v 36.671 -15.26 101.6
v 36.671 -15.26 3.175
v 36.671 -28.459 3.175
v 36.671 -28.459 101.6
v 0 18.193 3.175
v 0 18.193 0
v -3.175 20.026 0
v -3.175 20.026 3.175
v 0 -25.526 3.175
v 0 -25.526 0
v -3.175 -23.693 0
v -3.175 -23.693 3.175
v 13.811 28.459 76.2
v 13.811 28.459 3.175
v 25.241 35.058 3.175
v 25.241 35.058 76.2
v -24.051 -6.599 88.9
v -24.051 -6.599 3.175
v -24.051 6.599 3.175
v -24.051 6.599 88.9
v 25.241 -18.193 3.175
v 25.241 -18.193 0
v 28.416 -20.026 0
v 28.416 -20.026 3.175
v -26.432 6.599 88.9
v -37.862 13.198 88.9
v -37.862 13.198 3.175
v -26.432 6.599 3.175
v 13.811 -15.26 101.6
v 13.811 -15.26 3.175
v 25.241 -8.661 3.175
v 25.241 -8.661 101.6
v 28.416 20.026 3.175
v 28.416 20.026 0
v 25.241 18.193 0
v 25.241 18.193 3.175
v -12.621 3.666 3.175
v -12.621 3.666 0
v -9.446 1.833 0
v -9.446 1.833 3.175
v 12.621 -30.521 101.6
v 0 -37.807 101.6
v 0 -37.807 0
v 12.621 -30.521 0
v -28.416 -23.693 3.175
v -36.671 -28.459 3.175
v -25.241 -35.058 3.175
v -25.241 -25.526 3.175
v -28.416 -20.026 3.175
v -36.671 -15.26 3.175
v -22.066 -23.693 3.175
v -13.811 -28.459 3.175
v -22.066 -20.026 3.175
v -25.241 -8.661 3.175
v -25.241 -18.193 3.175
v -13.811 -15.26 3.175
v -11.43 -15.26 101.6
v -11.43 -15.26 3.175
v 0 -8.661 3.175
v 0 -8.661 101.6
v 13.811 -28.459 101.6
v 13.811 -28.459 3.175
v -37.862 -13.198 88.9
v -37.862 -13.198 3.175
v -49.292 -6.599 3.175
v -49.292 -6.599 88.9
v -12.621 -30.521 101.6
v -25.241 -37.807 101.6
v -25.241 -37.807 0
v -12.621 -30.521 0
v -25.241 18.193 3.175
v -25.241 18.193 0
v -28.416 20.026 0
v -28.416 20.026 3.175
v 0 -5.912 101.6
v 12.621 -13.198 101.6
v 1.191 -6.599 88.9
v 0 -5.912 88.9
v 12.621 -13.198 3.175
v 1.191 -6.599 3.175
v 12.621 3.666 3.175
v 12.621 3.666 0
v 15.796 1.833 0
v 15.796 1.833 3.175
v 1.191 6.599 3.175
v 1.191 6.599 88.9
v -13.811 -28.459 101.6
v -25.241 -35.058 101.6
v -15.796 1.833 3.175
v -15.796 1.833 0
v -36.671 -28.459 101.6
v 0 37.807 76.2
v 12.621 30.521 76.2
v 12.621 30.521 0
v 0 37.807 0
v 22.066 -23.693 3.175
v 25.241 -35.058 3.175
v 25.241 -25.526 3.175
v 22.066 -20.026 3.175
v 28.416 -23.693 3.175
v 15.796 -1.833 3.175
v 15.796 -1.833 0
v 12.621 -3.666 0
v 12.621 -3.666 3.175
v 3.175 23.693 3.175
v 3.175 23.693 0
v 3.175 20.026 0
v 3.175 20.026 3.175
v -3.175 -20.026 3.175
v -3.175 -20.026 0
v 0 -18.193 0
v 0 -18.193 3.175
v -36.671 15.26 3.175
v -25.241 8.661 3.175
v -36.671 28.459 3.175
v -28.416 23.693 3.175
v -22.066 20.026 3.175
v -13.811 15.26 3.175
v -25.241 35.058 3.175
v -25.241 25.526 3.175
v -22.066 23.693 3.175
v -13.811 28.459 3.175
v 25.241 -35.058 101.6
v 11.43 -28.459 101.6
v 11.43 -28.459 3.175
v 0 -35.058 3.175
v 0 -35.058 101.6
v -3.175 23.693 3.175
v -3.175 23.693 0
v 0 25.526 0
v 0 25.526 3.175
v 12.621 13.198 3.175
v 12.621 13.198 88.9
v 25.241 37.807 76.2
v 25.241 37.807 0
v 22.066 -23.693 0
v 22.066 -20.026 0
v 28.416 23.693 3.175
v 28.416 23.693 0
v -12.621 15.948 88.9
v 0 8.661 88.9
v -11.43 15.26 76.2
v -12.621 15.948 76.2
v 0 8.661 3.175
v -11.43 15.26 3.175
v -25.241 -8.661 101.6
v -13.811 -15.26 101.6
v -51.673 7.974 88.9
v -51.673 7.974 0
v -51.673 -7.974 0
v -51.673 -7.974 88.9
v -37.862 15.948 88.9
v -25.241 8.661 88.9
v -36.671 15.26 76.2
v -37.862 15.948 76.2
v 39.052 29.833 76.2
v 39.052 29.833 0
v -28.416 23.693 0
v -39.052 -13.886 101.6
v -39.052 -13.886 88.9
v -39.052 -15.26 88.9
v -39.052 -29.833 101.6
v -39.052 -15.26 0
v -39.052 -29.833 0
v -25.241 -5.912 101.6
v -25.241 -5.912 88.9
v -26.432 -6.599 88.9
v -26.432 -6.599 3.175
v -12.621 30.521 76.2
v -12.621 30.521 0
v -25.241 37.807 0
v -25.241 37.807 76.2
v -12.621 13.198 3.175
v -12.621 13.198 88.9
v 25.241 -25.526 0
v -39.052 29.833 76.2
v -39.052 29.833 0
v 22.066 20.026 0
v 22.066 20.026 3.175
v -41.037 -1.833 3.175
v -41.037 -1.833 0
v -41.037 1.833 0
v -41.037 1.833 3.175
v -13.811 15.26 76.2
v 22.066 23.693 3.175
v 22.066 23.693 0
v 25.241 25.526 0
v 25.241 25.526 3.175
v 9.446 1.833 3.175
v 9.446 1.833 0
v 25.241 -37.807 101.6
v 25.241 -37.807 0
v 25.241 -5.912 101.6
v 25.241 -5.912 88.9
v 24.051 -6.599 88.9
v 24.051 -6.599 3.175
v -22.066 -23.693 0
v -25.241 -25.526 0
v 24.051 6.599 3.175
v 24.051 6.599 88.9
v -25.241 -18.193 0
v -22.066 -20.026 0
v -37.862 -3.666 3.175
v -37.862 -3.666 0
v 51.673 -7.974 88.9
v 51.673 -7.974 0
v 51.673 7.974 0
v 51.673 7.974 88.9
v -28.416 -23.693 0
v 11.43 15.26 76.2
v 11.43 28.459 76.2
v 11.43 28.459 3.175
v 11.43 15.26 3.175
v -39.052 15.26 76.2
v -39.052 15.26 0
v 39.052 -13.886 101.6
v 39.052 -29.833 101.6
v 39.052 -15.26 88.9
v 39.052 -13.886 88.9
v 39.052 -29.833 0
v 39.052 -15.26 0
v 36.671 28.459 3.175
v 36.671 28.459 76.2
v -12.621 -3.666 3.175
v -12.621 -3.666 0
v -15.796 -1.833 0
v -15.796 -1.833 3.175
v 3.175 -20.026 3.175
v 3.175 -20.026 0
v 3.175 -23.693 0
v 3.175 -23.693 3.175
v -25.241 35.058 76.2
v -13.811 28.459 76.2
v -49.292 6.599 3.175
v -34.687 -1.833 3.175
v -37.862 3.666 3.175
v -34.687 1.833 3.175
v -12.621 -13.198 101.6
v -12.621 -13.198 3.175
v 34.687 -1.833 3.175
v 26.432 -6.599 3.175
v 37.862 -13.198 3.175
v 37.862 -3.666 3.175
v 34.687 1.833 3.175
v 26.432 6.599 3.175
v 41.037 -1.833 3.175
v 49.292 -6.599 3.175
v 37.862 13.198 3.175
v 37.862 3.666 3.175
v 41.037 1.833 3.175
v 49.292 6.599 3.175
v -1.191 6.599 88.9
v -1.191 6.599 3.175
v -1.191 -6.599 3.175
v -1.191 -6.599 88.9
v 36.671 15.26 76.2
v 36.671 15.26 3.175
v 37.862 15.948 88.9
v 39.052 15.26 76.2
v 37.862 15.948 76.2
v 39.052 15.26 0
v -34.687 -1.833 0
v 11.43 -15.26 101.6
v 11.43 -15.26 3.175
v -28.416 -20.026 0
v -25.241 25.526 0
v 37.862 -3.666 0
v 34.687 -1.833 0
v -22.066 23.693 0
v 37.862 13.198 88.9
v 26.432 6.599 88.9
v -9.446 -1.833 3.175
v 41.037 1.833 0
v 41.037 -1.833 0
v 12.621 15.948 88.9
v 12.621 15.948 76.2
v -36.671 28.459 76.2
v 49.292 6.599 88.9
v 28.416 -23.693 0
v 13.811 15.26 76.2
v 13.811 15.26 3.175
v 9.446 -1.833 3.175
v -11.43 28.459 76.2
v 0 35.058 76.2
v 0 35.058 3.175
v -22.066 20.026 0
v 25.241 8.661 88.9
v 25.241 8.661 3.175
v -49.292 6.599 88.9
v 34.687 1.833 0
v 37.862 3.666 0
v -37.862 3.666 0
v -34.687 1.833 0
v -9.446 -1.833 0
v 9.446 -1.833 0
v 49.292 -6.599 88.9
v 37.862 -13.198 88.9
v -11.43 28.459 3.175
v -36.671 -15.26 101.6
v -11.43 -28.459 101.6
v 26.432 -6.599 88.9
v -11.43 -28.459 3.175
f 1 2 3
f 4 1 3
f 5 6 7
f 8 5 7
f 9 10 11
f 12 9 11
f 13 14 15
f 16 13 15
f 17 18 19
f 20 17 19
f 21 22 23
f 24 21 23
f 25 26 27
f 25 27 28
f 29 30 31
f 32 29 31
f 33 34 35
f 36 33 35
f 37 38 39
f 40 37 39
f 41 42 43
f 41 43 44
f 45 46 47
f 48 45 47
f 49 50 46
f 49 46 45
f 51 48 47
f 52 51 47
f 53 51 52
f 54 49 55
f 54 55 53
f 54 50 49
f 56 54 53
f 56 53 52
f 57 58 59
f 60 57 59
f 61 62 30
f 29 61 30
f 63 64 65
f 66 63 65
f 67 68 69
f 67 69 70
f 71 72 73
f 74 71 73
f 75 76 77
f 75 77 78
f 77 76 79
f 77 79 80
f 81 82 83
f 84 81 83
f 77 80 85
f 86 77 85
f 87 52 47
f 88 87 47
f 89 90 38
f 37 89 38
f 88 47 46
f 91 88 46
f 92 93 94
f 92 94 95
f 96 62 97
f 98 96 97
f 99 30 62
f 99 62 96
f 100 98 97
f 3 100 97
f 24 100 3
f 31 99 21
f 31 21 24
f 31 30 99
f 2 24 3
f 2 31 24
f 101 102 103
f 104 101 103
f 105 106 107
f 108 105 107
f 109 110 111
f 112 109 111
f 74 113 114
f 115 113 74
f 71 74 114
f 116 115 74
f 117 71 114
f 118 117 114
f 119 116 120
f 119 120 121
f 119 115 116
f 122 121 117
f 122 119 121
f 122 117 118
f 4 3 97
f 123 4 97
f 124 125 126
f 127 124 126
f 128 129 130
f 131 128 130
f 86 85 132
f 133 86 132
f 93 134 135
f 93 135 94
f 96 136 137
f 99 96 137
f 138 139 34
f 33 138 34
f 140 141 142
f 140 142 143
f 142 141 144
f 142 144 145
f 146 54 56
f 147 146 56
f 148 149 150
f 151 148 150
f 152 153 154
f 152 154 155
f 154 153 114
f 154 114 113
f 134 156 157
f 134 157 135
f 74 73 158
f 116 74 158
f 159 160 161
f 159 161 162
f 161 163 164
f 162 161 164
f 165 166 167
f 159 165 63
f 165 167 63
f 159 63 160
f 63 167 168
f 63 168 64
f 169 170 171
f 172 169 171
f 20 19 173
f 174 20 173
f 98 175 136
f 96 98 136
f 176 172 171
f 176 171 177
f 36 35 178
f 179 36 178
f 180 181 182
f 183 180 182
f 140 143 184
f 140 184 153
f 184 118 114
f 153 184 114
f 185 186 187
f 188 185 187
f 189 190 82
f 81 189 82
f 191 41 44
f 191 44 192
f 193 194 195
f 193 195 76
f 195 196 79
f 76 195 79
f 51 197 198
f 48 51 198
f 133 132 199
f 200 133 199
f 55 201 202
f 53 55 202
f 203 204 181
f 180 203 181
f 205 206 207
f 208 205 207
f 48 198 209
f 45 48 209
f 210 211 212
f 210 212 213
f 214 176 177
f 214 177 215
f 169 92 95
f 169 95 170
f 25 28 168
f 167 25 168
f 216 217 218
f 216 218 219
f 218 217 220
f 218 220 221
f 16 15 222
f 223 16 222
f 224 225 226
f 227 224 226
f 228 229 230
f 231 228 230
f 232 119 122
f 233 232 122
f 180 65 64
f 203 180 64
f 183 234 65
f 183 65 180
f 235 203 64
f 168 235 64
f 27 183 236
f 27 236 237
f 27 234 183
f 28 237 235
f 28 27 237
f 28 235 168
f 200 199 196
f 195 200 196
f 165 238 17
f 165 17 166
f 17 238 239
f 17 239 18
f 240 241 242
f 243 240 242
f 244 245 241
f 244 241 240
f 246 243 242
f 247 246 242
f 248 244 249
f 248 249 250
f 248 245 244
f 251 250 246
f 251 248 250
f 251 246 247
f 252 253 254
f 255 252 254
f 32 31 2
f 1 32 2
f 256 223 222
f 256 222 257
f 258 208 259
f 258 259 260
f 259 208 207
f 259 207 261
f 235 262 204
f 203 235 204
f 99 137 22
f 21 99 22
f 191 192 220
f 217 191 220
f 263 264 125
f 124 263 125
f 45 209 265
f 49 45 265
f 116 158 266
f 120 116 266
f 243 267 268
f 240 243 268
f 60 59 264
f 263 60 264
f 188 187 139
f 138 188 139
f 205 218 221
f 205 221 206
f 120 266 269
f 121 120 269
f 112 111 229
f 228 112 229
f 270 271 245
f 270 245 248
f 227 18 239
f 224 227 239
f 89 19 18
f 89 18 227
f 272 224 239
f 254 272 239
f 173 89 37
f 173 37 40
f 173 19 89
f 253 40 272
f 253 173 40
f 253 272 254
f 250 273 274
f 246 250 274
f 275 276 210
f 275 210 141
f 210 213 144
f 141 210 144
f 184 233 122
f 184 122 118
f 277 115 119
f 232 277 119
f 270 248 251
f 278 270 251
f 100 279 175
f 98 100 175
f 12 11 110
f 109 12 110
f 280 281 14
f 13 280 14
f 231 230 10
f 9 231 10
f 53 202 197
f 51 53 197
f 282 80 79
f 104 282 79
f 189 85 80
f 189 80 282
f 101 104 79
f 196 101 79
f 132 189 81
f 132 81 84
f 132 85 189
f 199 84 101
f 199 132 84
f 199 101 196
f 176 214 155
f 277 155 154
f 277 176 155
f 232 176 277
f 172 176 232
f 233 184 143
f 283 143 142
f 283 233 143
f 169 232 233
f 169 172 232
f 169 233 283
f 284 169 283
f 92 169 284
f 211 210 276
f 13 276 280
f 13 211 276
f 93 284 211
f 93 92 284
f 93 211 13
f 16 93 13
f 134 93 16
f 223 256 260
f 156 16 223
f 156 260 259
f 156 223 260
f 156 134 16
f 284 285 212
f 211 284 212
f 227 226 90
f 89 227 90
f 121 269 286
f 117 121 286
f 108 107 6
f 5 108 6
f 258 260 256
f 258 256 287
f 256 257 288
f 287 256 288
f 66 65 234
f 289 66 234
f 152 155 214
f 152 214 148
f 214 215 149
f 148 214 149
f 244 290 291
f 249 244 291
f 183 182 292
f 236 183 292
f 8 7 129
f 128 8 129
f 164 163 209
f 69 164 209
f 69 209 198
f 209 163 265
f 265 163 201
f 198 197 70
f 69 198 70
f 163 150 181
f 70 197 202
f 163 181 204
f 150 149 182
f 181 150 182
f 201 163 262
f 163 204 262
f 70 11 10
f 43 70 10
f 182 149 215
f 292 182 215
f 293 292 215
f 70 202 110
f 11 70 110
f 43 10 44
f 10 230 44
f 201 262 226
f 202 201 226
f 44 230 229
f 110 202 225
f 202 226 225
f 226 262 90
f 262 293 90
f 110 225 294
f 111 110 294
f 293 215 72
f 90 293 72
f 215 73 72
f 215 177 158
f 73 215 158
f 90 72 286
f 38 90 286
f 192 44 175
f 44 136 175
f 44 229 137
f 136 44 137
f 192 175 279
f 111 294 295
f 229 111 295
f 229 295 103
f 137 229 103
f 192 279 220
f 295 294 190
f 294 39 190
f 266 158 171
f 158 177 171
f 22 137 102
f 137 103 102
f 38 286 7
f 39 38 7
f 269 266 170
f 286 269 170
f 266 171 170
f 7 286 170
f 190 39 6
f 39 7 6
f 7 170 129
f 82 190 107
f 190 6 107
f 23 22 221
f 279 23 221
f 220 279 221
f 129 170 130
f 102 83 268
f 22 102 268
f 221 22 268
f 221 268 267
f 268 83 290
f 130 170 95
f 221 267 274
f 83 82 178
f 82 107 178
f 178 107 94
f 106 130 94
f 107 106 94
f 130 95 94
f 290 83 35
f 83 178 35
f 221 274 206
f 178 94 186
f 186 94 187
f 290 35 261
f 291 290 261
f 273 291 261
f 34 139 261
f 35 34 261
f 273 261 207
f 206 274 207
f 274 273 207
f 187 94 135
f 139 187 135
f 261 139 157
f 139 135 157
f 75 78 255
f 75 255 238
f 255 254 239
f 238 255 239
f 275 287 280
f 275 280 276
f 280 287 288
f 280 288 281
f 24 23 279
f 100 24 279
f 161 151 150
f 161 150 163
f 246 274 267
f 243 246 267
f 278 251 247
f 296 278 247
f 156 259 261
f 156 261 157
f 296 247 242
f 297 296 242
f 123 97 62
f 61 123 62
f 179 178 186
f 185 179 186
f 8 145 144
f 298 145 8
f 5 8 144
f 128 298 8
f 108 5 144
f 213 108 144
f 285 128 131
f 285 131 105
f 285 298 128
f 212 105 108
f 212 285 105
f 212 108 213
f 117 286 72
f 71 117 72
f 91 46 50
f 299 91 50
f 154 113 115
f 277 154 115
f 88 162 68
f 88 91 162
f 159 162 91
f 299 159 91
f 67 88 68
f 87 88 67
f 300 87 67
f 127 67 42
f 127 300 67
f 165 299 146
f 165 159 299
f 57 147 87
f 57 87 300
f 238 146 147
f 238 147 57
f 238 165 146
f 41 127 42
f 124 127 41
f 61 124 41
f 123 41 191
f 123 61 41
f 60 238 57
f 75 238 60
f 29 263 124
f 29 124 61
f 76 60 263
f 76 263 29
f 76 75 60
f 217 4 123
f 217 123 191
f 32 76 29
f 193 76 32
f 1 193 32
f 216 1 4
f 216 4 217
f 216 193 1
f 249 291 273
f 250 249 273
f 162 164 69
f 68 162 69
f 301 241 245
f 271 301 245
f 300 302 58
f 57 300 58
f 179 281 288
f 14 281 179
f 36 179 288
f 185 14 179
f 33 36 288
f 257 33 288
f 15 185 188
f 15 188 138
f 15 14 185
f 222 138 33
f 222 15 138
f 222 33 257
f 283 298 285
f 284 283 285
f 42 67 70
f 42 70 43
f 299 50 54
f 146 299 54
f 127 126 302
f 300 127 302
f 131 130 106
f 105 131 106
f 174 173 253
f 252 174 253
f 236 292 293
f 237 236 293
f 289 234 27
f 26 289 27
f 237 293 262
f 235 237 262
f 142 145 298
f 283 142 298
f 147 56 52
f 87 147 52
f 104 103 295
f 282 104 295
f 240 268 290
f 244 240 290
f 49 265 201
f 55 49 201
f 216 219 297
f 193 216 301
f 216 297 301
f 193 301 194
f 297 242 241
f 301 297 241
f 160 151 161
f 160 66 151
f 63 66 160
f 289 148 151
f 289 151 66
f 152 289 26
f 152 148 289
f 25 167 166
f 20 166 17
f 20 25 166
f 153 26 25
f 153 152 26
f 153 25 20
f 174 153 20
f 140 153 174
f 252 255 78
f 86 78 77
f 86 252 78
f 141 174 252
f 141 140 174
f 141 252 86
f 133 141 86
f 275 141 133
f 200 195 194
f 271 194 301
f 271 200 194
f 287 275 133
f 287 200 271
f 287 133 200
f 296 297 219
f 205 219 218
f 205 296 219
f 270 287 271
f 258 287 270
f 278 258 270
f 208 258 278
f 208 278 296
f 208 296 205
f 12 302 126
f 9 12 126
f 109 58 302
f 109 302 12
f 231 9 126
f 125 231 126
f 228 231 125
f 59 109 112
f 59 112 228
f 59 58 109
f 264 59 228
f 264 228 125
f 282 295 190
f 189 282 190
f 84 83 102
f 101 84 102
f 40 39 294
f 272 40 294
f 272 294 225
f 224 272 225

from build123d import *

# Parameters (mm, degrees)
F3_DEPTH = 101.6
F4_DEPTH = 88.9
F5_DEPTH = 76.2
F7_DEPTH = 3.175


with BuildPart() as f3:
    # F1 (on Top) → F3 (new body)
    with BuildSketch(Plane.XY):
        Polygon((0, -5.911706), (-12.620625, -13.198227), (-25.24125, -5.911706), (-39.0525, -13.885635), (-39.0525, -29.833493), (-25.24125, -37.807422), (-12.620625, -30.5209), (0, -37.807422), (12.620625, -30.5209), (25.24125, -37.807422), (39.0525, -29.833493), (39.0525, -13.885635), (25.24125, -5.911706), (12.620625, -13.198227), align=None)
        Polygon((0, -35.057791), (-11.43, -28.458677), (-11.43, -15.26045), (0, -8.661337), (11.43, -15.26045), (11.43, -28.458677), align=None, mode=Mode.SUBTRACT)
        Polygon((-25.24125, -35.057791), (-36.67125, -28.458677), (-36.67125, -15.26045), (-25.24125, -8.661337), (-13.81125, -15.26045), (-13.81125, -28.458677), align=None, mode=Mode.SUBTRACT)
        Polygon((13.81125, -28.458677), (13.81125, -15.26045), (25.24125, -8.661337), (36.67125, -15.26045), (36.67125, -28.458677), (25.24125, -35.057791), align=None, mode=Mode.SUBTRACT)
    extrude(amount=F3_DEPTH)

    # F0 (on Top) → F4 (join)
    with BuildSketch(Plane.XY):
        Polygon((-26.431875, -6.599114), (-24.050625, -6.599114), (-24.050625, 6.599114), (-12.620625, 13.198227), (-1.190625, 6.599114), (-1.190625, -6.599114), (1.190625, -6.599114), (1.190625, 6.599114), (12.620625, 13.198227), (24.050625, 6.599114), (24.050625, -6.599114), (26.431875, -6.599114), (26.431875, 6.599114), (37.861875, 13.198227), (49.291875, 6.599114), (49.291875, -6.599114), (37.861875, -13.198227), (39.0525, -15.26045), (51.673125, -7.973929), (51.673125, 7.973929), (37.861875, 15.947858), (25.24125, 8.661337), (12.620625, 15.947858), (0, 8.661337), (-12.620625, 15.947858), (-25.24125, 8.661337), (-37.861875, 15.947858), (-51.673125, 7.973929), (-51.673125, -7.973929), (-39.0525, -15.26045), (-37.861875, -13.198227), (-49.291875, -6.599114), (-49.291875, 6.599114), (-37.861875, 13.198227), (-26.431875, 6.599114), align=None)
    extrude(amount=F4_DEPTH)

    # F2 (on Top) → F5 (join)
    with BuildSketch(Plane.XY):
        Polygon((-13.81125, 15.26045), (-11.43, 15.26045), (-11.43, 28.458677), (0, 35.057791), (11.43, 28.458677), (11.43, 15.26045), (13.81125, 15.26045), (13.81125, 28.458677), (25.24125, 35.057791), (36.67125, 28.458677), (36.67125, 15.26045), (39.0525, 15.26045), (39.0525, 29.833493), (25.24125, 37.807422), (12.620625, 30.5209), (0, 37.807422), (-12.620625, 30.5209), (-25.24125, 37.807422), (-39.0525, 29.833493), (-39.0525, 15.26045), (-36.67125, 15.26045), (-36.67125, 28.458677), (-25.24125, 35.057791), (-13.81125, 28.458677), align=None)
    extrude(amount=F5_DEPTH)

    # F6 (on Top) → F7 (join)
    with BuildSketch(Plane.XY):
        Polygon((-49.291875, 6.599114), (-49.291875, -6.599114), (-37.861875, -13.198227), (-26.431875, -6.599114), (-26.431875, 6.599114), (-37.861875, 13.198227), align=None)
        Polygon((-37.861875, -3.666174), (-41.036875, -1.833087), (-41.036875, 1.833087), (-37.861875, 3.666174), (-34.686875, 1.833087), (-34.686875, -1.833087), align=None, mode=Mode.SUBTRACT)
        Polygon((-24.050625, 6.599114), (-24.050625, -6.599114), (-12.620625, -13.198227), (-1.190625, -6.599114), (-1.190625, 6.599114), (-12.620625, 13.198227), align=None)
        Polygon((-15.795625, -1.833087), (-15.795625, 1.833087), (-12.620625, 3.666174), (-9.445625, 1.833087), (-9.445625, -1.833087), (-12.620625, -3.666174), align=None, mode=Mode.SUBTRACT)
        Polygon((-13.81125, -28.458677), (-13.81125, -15.26045), (-25.24125, -8.661337), (-36.67125, -15.26045), (-36.67125, -28.458677), (-25.24125, -35.057791), align=None)
        Polygon((-28.41625, -23.692651), (-28.41625, -20.026477), (-25.24125, -18.19339), (-22.06625, -20.026477), (-22.06625, -23.692651), (-25.24125, -25.525738), align=None, mode=Mode.SUBTRACT)
        Polygon((-36.67125, 28.458677), (-36.67125, 15.26045), (-25.24125, 8.661337), (-13.81125, 15.26045), (-13.81125, 28.458677), (-25.24125, 35.057791), align=None)
        Polygon((-25.24125, 18.19339), (-28.41625, 20.026477), (-28.41625, 23.692651), (-25.24125, 25.525738), (-22.06625, 23.692651), (-22.06625, 20.026477), align=None, mode=Mode.SUBTRACT)
        Polygon((-11.43, 28.458677), (-11.43, 15.26045), (0, 8.661337), (11.43, 15.26045), (11.43, 28.458677), (0, 35.057791), align=None)
        Polygon((-3.175, 20.026477), (-3.175, 23.692651), (0, 25.525738), (3.175, 23.692651), (3.175, 20.026477), (0, 18.19339), align=None, mode=Mode.SUBTRACT)
        Polygon((13.81125, 28.458677), (13.81125, 15.26045), (25.24125, 8.661337), (36.67125, 15.26045), (36.67125, 28.458677), (25.24125, 35.057791), align=None)
        Polygon((25.24125, 25.525738), (28.41625, 23.692651), (28.41625, 20.026477), (25.24125, 18.19339), (22.06625, 20.026477), (22.06625, 23.692651), align=None, mode=Mode.SUBTRACT)
        Polygon((24.050625, -6.599114), (24.050625, 6.599114), (12.620625, 13.198227), (1.190625, 6.599114), (1.190625, -6.599114), (12.620625, -13.198227), align=None)
        Polygon((12.620625, -3.666174), (9.445625, -1.833087), (9.445625, 1.833087), (12.620625, 3.666174), (15.795625, 1.833087), (15.795625, -1.833087), align=None, mode=Mode.SUBTRACT)
        Polygon((26.431875, 6.599114), (26.431875, -6.599114), (37.861875, -13.198227), (49.291875, -6.599114), (49.291875, 6.599114), (37.861875, 13.198227), align=None)
        Polygon((34.686875, 1.833087), (37.861875, 3.666174), (41.036875, 1.833087), (41.036875, -1.833087), (37.861875, -3.666174), (34.686875, -1.833087), align=None, mode=Mode.SUBTRACT)
        Polygon((36.67125, -28.458677), (36.67125, -15.26045), (25.24125, -8.661337), (13.81125, -15.26045), (13.81125, -28.458677), (25.24125, -35.057791), align=None)
        Polygon((22.06625, -20.026477), (25.24125, -18.19339), (28.41625, -20.026477), (28.41625, -23.692651), (25.24125, -25.525738), (22.06625, -23.692651), align=None, mode=Mode.SUBTRACT)
        Polygon((-11.43, -15.26045), (-11.43, -28.458677), (0, -35.057791), (11.43, -28.458677), (11.43, -15.26045), (0, -8.661337), align=None)
        Polygon((-3.175, -23.692651), (-3.175, -20.026477), (0, -18.19339), (3.175, -20.026477), (3.175, -23.692651), (0, -25.525738), align=None, mode=Mode.SUBTRACT)
    extrude(amount=F7_DEPTH)


solid = f3.part
